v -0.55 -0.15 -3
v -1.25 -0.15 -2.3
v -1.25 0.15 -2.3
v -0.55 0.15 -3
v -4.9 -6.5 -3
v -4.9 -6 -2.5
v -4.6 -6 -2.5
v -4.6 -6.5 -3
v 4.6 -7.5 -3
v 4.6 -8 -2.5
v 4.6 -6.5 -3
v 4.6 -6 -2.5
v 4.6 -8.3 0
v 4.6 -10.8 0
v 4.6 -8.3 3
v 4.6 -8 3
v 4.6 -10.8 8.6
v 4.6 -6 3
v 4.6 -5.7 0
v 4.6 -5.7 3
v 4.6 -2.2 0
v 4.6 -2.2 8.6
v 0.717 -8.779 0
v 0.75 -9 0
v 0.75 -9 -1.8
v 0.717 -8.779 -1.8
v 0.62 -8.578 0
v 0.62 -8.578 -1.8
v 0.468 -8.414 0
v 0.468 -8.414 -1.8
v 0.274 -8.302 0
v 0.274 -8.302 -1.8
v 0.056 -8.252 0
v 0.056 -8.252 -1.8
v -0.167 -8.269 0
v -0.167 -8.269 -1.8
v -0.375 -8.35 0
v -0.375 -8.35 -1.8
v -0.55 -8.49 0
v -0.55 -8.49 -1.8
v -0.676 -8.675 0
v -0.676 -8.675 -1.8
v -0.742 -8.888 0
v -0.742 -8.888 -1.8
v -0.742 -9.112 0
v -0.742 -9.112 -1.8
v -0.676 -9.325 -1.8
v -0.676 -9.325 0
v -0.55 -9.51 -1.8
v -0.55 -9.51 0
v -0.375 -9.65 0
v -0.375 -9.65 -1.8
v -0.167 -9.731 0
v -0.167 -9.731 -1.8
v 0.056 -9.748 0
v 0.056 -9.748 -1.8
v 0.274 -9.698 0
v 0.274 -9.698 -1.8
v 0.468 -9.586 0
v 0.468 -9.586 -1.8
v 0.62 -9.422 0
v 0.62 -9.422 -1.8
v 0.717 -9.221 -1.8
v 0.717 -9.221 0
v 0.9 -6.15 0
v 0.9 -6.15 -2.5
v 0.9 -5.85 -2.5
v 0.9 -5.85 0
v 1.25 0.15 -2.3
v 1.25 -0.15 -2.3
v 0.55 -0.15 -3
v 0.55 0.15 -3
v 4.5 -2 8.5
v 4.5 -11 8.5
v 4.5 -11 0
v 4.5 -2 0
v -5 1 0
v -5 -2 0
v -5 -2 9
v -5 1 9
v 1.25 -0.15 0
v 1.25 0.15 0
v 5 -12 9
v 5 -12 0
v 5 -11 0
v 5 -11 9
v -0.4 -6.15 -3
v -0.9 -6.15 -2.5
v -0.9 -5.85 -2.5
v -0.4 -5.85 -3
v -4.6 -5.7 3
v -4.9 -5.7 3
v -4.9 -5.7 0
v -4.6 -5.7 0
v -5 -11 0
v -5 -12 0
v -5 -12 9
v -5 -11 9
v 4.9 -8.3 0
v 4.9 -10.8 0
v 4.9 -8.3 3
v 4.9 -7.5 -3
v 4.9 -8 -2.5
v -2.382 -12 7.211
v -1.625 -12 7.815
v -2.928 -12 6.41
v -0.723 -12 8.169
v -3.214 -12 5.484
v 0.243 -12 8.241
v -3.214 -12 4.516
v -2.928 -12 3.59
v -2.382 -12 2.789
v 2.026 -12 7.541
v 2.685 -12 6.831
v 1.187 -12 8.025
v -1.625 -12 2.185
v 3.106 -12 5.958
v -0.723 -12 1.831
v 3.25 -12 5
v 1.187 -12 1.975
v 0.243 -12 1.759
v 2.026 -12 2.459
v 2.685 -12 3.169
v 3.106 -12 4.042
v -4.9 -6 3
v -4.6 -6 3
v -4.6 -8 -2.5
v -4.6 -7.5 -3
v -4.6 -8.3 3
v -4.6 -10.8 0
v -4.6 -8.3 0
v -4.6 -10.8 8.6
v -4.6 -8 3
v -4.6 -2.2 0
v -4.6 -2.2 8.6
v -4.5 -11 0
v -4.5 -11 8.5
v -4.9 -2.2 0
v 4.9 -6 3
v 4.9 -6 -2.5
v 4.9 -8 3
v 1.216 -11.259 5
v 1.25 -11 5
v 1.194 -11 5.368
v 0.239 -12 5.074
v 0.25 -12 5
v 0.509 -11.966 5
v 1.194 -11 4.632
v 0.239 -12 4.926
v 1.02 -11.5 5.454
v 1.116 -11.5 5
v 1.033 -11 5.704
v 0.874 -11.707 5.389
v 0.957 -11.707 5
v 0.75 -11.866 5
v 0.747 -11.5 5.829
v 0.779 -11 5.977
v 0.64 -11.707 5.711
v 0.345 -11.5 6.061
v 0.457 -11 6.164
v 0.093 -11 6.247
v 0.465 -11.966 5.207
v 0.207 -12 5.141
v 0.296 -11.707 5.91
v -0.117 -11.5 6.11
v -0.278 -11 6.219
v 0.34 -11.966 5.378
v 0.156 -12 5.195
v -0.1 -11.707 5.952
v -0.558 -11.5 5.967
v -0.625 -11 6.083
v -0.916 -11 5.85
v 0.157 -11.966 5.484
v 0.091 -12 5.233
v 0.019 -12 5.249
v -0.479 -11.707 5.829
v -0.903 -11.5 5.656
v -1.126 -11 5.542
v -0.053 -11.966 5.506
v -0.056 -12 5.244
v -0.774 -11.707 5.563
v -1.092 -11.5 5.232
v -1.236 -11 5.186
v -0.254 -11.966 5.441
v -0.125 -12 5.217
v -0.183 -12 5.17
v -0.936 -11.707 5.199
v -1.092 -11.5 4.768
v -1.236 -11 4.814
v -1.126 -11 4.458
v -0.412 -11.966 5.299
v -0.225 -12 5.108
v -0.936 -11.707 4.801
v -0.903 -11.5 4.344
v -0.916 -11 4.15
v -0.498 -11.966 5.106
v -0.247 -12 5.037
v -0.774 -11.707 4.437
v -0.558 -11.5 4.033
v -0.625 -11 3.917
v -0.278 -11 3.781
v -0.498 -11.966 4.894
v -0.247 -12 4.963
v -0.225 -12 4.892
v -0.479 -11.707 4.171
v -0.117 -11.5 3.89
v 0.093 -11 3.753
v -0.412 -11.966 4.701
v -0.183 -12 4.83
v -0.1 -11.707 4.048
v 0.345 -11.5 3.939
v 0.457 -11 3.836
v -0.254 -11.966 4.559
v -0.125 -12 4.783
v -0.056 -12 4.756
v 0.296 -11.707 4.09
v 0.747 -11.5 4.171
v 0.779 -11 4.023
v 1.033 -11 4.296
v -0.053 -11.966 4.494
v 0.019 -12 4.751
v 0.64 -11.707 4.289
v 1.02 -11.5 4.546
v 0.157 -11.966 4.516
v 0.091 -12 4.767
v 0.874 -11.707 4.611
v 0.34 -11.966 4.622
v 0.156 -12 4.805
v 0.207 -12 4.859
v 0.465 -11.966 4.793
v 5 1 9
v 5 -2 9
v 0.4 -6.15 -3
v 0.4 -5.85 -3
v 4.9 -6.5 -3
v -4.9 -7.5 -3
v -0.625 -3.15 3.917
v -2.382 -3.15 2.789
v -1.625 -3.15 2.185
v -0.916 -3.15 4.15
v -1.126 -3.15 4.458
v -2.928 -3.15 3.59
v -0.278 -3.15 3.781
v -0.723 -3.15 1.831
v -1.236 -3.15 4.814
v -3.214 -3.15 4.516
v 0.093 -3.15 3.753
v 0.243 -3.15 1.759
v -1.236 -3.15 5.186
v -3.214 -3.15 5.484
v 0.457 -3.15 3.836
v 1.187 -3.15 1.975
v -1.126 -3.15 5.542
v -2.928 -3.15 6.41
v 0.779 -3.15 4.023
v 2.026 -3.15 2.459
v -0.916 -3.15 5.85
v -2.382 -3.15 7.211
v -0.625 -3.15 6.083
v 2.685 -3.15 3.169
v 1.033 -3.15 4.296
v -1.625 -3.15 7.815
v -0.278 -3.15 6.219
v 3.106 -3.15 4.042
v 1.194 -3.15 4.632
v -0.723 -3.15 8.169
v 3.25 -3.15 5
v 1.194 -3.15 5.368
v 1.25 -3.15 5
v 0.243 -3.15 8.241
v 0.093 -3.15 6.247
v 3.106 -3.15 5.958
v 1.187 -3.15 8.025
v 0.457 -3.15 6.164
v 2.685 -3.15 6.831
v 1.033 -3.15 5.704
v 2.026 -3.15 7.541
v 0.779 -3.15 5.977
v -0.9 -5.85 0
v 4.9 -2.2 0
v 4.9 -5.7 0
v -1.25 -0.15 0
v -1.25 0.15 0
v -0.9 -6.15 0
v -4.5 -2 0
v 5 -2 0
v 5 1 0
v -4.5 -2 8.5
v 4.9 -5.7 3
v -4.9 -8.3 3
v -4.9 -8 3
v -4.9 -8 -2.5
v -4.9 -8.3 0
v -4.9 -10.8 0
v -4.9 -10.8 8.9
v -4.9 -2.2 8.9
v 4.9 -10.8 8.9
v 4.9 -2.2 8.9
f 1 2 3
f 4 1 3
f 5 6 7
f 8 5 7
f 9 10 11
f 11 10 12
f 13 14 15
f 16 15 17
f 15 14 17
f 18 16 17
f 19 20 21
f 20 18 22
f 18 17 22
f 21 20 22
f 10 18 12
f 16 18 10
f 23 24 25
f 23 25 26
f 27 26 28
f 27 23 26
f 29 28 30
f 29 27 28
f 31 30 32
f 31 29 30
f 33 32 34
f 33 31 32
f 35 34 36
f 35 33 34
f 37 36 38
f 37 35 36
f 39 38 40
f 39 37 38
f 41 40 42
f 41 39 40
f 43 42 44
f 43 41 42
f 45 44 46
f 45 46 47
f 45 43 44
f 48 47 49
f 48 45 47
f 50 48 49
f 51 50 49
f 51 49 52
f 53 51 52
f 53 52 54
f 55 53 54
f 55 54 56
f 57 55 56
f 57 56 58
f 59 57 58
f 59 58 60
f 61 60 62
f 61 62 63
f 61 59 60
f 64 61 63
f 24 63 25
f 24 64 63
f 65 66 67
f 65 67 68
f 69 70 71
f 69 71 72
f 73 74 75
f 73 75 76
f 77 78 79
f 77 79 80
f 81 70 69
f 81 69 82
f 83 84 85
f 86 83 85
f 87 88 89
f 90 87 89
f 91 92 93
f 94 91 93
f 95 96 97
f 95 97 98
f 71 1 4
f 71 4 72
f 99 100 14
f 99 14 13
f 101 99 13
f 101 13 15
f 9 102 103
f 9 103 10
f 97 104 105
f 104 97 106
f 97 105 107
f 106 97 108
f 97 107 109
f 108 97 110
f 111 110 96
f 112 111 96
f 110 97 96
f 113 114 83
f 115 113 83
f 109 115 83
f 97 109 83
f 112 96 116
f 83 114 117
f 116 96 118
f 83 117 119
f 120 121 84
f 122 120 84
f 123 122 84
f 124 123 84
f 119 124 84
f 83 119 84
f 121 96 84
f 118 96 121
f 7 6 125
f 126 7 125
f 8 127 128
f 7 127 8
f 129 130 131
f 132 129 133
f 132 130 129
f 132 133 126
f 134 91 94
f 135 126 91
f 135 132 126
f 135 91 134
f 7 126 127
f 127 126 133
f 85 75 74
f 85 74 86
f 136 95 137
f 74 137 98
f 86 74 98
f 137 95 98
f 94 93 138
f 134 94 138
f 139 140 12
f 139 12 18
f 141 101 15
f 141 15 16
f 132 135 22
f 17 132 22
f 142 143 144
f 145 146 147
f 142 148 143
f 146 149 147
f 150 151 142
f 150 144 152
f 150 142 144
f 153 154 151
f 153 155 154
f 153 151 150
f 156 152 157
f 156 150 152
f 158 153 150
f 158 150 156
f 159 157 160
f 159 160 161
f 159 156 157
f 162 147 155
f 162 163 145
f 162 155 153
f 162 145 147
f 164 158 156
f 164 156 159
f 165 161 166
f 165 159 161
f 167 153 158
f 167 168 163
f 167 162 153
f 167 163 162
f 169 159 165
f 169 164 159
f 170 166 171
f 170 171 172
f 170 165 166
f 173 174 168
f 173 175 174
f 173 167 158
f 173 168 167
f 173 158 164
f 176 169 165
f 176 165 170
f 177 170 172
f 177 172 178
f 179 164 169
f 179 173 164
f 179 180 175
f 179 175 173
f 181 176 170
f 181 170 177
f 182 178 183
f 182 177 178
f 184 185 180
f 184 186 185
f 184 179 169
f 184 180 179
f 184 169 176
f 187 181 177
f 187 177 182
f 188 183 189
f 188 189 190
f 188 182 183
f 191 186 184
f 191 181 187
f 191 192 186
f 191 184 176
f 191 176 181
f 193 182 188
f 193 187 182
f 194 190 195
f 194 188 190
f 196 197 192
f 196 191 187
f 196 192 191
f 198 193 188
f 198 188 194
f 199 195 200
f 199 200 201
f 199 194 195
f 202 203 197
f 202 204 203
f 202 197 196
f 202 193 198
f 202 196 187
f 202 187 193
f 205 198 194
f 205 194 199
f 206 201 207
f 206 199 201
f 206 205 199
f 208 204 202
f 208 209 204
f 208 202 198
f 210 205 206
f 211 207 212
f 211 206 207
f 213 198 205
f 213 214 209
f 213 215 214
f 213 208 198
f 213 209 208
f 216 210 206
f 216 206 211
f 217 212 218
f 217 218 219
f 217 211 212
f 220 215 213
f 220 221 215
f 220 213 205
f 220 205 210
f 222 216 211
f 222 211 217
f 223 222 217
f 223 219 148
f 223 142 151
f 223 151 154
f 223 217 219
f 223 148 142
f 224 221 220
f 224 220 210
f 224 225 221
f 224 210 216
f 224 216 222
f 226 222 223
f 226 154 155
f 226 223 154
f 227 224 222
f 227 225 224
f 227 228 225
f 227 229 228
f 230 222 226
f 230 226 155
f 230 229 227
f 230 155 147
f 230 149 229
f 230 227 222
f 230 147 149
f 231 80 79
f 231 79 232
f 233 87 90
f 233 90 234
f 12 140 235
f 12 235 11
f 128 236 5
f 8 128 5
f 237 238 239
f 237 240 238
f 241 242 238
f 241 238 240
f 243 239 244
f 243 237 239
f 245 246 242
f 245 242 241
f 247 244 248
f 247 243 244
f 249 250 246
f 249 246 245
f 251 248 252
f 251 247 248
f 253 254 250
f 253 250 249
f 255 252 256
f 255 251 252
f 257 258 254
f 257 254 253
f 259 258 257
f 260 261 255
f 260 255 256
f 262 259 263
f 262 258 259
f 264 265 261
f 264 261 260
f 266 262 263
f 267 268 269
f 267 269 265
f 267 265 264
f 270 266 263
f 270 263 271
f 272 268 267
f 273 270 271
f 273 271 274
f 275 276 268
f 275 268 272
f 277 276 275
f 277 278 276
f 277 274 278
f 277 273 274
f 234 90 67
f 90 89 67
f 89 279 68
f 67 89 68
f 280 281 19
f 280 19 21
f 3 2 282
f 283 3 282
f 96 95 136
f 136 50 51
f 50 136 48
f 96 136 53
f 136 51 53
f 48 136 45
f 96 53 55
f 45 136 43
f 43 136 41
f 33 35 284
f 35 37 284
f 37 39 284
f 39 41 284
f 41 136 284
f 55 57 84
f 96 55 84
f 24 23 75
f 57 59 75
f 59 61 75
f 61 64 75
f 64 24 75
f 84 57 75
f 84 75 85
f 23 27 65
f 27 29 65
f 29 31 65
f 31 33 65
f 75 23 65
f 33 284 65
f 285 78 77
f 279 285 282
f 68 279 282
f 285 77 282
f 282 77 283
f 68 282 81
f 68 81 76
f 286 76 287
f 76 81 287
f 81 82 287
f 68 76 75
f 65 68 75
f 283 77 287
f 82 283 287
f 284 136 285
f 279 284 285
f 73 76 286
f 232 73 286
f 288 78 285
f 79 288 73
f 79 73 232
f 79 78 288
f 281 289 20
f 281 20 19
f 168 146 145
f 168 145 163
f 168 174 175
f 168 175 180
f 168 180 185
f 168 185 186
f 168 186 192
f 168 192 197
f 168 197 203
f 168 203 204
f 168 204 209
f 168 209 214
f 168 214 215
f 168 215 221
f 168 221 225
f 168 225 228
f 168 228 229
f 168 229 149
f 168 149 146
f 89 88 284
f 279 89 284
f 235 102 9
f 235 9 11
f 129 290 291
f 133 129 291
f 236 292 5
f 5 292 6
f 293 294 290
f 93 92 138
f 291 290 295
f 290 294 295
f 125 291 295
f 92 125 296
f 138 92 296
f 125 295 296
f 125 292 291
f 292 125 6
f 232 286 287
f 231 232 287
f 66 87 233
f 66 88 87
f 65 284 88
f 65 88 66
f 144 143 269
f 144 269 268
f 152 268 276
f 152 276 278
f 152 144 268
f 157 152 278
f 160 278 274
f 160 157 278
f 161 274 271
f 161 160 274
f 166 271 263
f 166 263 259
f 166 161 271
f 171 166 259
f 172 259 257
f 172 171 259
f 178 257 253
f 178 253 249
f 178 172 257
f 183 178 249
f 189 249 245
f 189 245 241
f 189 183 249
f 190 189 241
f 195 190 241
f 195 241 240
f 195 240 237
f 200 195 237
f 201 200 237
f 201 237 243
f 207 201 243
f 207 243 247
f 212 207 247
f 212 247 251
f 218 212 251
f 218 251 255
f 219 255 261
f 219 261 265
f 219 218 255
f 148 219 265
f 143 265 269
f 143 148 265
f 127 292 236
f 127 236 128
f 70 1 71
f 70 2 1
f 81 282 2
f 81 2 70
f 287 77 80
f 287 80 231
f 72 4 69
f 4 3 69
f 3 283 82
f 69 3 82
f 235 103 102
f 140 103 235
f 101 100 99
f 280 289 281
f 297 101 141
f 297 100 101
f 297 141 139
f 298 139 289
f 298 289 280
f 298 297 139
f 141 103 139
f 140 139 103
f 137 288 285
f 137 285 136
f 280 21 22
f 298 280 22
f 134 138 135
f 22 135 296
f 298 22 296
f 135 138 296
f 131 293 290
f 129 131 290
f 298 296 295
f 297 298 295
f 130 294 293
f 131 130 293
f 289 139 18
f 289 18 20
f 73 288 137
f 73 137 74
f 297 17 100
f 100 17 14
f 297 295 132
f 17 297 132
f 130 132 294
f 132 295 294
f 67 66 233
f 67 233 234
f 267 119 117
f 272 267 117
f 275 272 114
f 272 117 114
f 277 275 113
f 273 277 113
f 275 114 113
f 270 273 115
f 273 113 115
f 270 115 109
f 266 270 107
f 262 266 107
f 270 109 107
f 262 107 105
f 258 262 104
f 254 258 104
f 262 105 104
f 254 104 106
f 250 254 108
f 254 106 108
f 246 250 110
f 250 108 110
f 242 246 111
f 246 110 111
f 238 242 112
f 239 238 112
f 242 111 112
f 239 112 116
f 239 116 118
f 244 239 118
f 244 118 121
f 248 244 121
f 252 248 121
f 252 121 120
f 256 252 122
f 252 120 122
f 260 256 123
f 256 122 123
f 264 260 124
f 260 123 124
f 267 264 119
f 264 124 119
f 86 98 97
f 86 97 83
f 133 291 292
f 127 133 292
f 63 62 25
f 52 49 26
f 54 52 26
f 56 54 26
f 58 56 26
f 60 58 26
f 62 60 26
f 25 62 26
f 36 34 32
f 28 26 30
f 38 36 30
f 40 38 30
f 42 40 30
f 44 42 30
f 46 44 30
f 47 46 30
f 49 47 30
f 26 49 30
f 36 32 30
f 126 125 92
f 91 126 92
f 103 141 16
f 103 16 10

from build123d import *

# Parameters (mm, degrees)
SKETCH002_R     = 1.25
PAD001_DEPTH    = 8.85
FILLET_R        = 1
SKETCH003_W     = 2.5
SKETCH003_H     = 3
PAD002_DEPTH    = 0.3
CHAMFER_SIZE    = 0.7
CHAMFER001_SIZE = 0.7
SKETCH004_W     = 1.8
SKETCH004_H     = 3
PAD003_DEPTH    = 0.3
CHAMFER002_SIZE = 0.5
CHAMFER003_SIZE = 0.5
PAD004_DEPTH    = 0.3
CHAMFER004_SIZE = 0.5
CHAMFER005_SIZE = 0.5
SKETCH_W        = 10
SKETCH_H        = 13
PAD_DEPTH       = 9
SKETCH005_R     = 3.25
POCKET_DEPTH    = 8.85
SKETCH008_W     = 9
SKETCH008_H     = 9
POCKET001_DEPTH = 0.5
SKETCH009_W     = 9
SKETCH009_H     = 9
POCKET002_DEPTH = 0.5
SKETCH010_W     = 10
SKETCH010_H     = 9
POCKET003_DEPTH = 0.5
SKETCH011_W     = 9.8
SKETCH011_H     = 8.6
PAD006_DEPTH    = 0.3
SKETCH007_R     = 0.75
PAD005_DEPTH    = 1.8


with BuildPart() as centralpin:
    # Sketch002 → Pad001 (new body)
    with BuildSketch(Plane.XZ.offset(12)):
        with Locations((0, 5)):
            Circle(SKETCH002_R)
    extrude(amount=-PAD001_DEPTH)

    # Fillet
    fillet_edges = [centralpin.edges().sort_by_distance(p)[0] for p in [
        (-1.25, -12, 5),
    ]]
    fillet(fillet_edges, radius=FILLET_R)


with BuildPart() as pin1:
    # Sketch003 → Pad002 (new body)
    with BuildSketch(Plane.XZ.offset(0.15)):
        with Locations((0, -1.5)):
            Rectangle(SKETCH003_W, SKETCH003_H)
    extrude(amount=-PAD002_DEPTH)

    # Chamfer
    chamfer_edges = [pin1.edges().sort_by_distance(p)[0] for p in [
        (1.25, 0, -3),
    ]]
    chamfer(chamfer_edges, length=CHAMFER_SIZE)

    # Chamfer001
    chamfer001_edges = [pin1.edges().sort_by_distance(p)[0] for p in [
        (-1.25, 0, -3),
    ]]
    chamfer(chamfer001_edges, length=CHAMFER001_SIZE)


with BuildPart() as pin2:
    # Sketch004 → Pad003 (new body)
    with BuildSketch(Plane.XZ.offset(6.15)):
        with Locations((0, -1.5)):
            Rectangle(SKETCH004_W, SKETCH004_H)
    extrude(amount=-PAD003_DEPTH)

    # Chamfer002
    chamfer002_edges = [pin2.edges().sort_by_distance(p)[0] for p in [
        (0.9, -6, -3),
    ]]
    chamfer(chamfer002_edges, length=CHAMFER002_SIZE)

    # Chamfer003
    chamfer003_edges = [pin2.edges().sort_by_distance(p)[0] for p in [
        (-0.9, -6, -3),
    ]]
    chamfer(chamfer003_edges, length=CHAMFER003_SIZE)


with BuildPart() as pin3:
    # Sketch006 → Pad004 (new body)
    with BuildSketch(Plane.YZ.offset(4.9)):
        Polygon((-8, -3), (-6, -3), (-6, 0), (-6, 3), (-5.7, 3), (-5.7, 0), (-2.2, 0), (-2.2, 8.9), (-10.8, 8.9), (-10.8, 0), (-8.3, 0), (-8.3, 3), (-8, 3), (-8, 0), align=None)
    extrude(amount=-PAD004_DEPTH)

    # Chamfer004
    chamfer004_edges = [pin3.edges().sort_by_distance(p)[0] for p in [
        (4.75, -8, -3),
    ]]
    chamfer(chamfer004_edges, length=CHAMFER004_SIZE)

    # Chamfer005
    chamfer005_edges = [pin3.edges().sort_by_distance(p)[0] for p in [
        (4.75, -6, -3),
    ]]
    chamfer(chamfer005_edges, length=CHAMFER005_SIZE)


with BuildPart() as pins3:
    # Part__Mirroring: instance of Pin3
    add(pin3.part.mirror(Plane(origin=(0, -7, -1.5), x_dir=(0, -1, 0), z_dir=(1, 0, 0))))


with BuildPart() as body:
    # Sketch → Pad (new body)
    with BuildSketch(Plane.XY):
        with Locations((0, -5.5)):
            Rectangle(SKETCH_W, SKETCH_H)
    extrude(amount=PAD_DEPTH)

    # Sketch005 → Pocket (cut)
    with BuildSketch(Plane.XZ.offset(12)):
        with Locations((0, 5)):
            Circle(SKETCH005_R)
    extrude(amount=-POCKET_DEPTH, mode=Mode.SUBTRACT)

    # Sketch008 → Pocket001 (cut)
    with BuildSketch(Plane.YZ.offset(5)):
        with Locations((-6.5, 4.5)):
            Rectangle(SKETCH008_W, SKETCH008_H)
    extrude(amount=-POCKET001_DEPTH, mode=Mode.SUBTRACT)

    # Sketch009 → Pocket002 (cut)
    with BuildSketch(Plane(origin=(-5, 0, 0), x_dir=(0, -1, 0), z_dir=(-1, 0, 0))):
        with Locations((6.5, 4.5)):
            Rectangle(SKETCH009_W, SKETCH009_H)
    extrude(amount=-POCKET002_DEPTH, mode=Mode.SUBTRACT)

    # Sketch010 → Pocket003 (cut)
    with BuildSketch(Plane.XY.offset(9)):
        with Locations((0, -6.5)):
            Rectangle(SKETCH010_W, SKETCH010_H)
    extrude(amount=-POCKET003_DEPTH, mode=Mode.SUBTRACT)


with BuildPart() as shieldtop:
    # Sketch011 → Pad006 (new body)
    with BuildSketch(Plane.XY.offset(8.6)):
        with Locations((0, -6.5)):
            Rectangle(SKETCH011_W, SKETCH011_H)
    extrude(amount=PAD006_DEPTH)


with BuildPart() as barreljack_cui_pj_063bh_horizontal:
    # Sketch007 → Pad005 (new body)
    with BuildSketch(Plane.XY):
        with Locations((0, -9)):
            Circle(SKETCH007_R)
    extrude(amount=-PAD005_DEPTH)

    # Fusion: union CentralPin, Pin1, Pin2, Pins3, Pin3, Body, ShieldTop
    add(centralpin.part)
    add(pin1.part)
    add(pin2.part)
    add(pins3.part)
    add(pin3.part)
    add(body.part)
    add(shieldtop.part)


solid = barreljack_cui_pj_063bh_horizontal.part
